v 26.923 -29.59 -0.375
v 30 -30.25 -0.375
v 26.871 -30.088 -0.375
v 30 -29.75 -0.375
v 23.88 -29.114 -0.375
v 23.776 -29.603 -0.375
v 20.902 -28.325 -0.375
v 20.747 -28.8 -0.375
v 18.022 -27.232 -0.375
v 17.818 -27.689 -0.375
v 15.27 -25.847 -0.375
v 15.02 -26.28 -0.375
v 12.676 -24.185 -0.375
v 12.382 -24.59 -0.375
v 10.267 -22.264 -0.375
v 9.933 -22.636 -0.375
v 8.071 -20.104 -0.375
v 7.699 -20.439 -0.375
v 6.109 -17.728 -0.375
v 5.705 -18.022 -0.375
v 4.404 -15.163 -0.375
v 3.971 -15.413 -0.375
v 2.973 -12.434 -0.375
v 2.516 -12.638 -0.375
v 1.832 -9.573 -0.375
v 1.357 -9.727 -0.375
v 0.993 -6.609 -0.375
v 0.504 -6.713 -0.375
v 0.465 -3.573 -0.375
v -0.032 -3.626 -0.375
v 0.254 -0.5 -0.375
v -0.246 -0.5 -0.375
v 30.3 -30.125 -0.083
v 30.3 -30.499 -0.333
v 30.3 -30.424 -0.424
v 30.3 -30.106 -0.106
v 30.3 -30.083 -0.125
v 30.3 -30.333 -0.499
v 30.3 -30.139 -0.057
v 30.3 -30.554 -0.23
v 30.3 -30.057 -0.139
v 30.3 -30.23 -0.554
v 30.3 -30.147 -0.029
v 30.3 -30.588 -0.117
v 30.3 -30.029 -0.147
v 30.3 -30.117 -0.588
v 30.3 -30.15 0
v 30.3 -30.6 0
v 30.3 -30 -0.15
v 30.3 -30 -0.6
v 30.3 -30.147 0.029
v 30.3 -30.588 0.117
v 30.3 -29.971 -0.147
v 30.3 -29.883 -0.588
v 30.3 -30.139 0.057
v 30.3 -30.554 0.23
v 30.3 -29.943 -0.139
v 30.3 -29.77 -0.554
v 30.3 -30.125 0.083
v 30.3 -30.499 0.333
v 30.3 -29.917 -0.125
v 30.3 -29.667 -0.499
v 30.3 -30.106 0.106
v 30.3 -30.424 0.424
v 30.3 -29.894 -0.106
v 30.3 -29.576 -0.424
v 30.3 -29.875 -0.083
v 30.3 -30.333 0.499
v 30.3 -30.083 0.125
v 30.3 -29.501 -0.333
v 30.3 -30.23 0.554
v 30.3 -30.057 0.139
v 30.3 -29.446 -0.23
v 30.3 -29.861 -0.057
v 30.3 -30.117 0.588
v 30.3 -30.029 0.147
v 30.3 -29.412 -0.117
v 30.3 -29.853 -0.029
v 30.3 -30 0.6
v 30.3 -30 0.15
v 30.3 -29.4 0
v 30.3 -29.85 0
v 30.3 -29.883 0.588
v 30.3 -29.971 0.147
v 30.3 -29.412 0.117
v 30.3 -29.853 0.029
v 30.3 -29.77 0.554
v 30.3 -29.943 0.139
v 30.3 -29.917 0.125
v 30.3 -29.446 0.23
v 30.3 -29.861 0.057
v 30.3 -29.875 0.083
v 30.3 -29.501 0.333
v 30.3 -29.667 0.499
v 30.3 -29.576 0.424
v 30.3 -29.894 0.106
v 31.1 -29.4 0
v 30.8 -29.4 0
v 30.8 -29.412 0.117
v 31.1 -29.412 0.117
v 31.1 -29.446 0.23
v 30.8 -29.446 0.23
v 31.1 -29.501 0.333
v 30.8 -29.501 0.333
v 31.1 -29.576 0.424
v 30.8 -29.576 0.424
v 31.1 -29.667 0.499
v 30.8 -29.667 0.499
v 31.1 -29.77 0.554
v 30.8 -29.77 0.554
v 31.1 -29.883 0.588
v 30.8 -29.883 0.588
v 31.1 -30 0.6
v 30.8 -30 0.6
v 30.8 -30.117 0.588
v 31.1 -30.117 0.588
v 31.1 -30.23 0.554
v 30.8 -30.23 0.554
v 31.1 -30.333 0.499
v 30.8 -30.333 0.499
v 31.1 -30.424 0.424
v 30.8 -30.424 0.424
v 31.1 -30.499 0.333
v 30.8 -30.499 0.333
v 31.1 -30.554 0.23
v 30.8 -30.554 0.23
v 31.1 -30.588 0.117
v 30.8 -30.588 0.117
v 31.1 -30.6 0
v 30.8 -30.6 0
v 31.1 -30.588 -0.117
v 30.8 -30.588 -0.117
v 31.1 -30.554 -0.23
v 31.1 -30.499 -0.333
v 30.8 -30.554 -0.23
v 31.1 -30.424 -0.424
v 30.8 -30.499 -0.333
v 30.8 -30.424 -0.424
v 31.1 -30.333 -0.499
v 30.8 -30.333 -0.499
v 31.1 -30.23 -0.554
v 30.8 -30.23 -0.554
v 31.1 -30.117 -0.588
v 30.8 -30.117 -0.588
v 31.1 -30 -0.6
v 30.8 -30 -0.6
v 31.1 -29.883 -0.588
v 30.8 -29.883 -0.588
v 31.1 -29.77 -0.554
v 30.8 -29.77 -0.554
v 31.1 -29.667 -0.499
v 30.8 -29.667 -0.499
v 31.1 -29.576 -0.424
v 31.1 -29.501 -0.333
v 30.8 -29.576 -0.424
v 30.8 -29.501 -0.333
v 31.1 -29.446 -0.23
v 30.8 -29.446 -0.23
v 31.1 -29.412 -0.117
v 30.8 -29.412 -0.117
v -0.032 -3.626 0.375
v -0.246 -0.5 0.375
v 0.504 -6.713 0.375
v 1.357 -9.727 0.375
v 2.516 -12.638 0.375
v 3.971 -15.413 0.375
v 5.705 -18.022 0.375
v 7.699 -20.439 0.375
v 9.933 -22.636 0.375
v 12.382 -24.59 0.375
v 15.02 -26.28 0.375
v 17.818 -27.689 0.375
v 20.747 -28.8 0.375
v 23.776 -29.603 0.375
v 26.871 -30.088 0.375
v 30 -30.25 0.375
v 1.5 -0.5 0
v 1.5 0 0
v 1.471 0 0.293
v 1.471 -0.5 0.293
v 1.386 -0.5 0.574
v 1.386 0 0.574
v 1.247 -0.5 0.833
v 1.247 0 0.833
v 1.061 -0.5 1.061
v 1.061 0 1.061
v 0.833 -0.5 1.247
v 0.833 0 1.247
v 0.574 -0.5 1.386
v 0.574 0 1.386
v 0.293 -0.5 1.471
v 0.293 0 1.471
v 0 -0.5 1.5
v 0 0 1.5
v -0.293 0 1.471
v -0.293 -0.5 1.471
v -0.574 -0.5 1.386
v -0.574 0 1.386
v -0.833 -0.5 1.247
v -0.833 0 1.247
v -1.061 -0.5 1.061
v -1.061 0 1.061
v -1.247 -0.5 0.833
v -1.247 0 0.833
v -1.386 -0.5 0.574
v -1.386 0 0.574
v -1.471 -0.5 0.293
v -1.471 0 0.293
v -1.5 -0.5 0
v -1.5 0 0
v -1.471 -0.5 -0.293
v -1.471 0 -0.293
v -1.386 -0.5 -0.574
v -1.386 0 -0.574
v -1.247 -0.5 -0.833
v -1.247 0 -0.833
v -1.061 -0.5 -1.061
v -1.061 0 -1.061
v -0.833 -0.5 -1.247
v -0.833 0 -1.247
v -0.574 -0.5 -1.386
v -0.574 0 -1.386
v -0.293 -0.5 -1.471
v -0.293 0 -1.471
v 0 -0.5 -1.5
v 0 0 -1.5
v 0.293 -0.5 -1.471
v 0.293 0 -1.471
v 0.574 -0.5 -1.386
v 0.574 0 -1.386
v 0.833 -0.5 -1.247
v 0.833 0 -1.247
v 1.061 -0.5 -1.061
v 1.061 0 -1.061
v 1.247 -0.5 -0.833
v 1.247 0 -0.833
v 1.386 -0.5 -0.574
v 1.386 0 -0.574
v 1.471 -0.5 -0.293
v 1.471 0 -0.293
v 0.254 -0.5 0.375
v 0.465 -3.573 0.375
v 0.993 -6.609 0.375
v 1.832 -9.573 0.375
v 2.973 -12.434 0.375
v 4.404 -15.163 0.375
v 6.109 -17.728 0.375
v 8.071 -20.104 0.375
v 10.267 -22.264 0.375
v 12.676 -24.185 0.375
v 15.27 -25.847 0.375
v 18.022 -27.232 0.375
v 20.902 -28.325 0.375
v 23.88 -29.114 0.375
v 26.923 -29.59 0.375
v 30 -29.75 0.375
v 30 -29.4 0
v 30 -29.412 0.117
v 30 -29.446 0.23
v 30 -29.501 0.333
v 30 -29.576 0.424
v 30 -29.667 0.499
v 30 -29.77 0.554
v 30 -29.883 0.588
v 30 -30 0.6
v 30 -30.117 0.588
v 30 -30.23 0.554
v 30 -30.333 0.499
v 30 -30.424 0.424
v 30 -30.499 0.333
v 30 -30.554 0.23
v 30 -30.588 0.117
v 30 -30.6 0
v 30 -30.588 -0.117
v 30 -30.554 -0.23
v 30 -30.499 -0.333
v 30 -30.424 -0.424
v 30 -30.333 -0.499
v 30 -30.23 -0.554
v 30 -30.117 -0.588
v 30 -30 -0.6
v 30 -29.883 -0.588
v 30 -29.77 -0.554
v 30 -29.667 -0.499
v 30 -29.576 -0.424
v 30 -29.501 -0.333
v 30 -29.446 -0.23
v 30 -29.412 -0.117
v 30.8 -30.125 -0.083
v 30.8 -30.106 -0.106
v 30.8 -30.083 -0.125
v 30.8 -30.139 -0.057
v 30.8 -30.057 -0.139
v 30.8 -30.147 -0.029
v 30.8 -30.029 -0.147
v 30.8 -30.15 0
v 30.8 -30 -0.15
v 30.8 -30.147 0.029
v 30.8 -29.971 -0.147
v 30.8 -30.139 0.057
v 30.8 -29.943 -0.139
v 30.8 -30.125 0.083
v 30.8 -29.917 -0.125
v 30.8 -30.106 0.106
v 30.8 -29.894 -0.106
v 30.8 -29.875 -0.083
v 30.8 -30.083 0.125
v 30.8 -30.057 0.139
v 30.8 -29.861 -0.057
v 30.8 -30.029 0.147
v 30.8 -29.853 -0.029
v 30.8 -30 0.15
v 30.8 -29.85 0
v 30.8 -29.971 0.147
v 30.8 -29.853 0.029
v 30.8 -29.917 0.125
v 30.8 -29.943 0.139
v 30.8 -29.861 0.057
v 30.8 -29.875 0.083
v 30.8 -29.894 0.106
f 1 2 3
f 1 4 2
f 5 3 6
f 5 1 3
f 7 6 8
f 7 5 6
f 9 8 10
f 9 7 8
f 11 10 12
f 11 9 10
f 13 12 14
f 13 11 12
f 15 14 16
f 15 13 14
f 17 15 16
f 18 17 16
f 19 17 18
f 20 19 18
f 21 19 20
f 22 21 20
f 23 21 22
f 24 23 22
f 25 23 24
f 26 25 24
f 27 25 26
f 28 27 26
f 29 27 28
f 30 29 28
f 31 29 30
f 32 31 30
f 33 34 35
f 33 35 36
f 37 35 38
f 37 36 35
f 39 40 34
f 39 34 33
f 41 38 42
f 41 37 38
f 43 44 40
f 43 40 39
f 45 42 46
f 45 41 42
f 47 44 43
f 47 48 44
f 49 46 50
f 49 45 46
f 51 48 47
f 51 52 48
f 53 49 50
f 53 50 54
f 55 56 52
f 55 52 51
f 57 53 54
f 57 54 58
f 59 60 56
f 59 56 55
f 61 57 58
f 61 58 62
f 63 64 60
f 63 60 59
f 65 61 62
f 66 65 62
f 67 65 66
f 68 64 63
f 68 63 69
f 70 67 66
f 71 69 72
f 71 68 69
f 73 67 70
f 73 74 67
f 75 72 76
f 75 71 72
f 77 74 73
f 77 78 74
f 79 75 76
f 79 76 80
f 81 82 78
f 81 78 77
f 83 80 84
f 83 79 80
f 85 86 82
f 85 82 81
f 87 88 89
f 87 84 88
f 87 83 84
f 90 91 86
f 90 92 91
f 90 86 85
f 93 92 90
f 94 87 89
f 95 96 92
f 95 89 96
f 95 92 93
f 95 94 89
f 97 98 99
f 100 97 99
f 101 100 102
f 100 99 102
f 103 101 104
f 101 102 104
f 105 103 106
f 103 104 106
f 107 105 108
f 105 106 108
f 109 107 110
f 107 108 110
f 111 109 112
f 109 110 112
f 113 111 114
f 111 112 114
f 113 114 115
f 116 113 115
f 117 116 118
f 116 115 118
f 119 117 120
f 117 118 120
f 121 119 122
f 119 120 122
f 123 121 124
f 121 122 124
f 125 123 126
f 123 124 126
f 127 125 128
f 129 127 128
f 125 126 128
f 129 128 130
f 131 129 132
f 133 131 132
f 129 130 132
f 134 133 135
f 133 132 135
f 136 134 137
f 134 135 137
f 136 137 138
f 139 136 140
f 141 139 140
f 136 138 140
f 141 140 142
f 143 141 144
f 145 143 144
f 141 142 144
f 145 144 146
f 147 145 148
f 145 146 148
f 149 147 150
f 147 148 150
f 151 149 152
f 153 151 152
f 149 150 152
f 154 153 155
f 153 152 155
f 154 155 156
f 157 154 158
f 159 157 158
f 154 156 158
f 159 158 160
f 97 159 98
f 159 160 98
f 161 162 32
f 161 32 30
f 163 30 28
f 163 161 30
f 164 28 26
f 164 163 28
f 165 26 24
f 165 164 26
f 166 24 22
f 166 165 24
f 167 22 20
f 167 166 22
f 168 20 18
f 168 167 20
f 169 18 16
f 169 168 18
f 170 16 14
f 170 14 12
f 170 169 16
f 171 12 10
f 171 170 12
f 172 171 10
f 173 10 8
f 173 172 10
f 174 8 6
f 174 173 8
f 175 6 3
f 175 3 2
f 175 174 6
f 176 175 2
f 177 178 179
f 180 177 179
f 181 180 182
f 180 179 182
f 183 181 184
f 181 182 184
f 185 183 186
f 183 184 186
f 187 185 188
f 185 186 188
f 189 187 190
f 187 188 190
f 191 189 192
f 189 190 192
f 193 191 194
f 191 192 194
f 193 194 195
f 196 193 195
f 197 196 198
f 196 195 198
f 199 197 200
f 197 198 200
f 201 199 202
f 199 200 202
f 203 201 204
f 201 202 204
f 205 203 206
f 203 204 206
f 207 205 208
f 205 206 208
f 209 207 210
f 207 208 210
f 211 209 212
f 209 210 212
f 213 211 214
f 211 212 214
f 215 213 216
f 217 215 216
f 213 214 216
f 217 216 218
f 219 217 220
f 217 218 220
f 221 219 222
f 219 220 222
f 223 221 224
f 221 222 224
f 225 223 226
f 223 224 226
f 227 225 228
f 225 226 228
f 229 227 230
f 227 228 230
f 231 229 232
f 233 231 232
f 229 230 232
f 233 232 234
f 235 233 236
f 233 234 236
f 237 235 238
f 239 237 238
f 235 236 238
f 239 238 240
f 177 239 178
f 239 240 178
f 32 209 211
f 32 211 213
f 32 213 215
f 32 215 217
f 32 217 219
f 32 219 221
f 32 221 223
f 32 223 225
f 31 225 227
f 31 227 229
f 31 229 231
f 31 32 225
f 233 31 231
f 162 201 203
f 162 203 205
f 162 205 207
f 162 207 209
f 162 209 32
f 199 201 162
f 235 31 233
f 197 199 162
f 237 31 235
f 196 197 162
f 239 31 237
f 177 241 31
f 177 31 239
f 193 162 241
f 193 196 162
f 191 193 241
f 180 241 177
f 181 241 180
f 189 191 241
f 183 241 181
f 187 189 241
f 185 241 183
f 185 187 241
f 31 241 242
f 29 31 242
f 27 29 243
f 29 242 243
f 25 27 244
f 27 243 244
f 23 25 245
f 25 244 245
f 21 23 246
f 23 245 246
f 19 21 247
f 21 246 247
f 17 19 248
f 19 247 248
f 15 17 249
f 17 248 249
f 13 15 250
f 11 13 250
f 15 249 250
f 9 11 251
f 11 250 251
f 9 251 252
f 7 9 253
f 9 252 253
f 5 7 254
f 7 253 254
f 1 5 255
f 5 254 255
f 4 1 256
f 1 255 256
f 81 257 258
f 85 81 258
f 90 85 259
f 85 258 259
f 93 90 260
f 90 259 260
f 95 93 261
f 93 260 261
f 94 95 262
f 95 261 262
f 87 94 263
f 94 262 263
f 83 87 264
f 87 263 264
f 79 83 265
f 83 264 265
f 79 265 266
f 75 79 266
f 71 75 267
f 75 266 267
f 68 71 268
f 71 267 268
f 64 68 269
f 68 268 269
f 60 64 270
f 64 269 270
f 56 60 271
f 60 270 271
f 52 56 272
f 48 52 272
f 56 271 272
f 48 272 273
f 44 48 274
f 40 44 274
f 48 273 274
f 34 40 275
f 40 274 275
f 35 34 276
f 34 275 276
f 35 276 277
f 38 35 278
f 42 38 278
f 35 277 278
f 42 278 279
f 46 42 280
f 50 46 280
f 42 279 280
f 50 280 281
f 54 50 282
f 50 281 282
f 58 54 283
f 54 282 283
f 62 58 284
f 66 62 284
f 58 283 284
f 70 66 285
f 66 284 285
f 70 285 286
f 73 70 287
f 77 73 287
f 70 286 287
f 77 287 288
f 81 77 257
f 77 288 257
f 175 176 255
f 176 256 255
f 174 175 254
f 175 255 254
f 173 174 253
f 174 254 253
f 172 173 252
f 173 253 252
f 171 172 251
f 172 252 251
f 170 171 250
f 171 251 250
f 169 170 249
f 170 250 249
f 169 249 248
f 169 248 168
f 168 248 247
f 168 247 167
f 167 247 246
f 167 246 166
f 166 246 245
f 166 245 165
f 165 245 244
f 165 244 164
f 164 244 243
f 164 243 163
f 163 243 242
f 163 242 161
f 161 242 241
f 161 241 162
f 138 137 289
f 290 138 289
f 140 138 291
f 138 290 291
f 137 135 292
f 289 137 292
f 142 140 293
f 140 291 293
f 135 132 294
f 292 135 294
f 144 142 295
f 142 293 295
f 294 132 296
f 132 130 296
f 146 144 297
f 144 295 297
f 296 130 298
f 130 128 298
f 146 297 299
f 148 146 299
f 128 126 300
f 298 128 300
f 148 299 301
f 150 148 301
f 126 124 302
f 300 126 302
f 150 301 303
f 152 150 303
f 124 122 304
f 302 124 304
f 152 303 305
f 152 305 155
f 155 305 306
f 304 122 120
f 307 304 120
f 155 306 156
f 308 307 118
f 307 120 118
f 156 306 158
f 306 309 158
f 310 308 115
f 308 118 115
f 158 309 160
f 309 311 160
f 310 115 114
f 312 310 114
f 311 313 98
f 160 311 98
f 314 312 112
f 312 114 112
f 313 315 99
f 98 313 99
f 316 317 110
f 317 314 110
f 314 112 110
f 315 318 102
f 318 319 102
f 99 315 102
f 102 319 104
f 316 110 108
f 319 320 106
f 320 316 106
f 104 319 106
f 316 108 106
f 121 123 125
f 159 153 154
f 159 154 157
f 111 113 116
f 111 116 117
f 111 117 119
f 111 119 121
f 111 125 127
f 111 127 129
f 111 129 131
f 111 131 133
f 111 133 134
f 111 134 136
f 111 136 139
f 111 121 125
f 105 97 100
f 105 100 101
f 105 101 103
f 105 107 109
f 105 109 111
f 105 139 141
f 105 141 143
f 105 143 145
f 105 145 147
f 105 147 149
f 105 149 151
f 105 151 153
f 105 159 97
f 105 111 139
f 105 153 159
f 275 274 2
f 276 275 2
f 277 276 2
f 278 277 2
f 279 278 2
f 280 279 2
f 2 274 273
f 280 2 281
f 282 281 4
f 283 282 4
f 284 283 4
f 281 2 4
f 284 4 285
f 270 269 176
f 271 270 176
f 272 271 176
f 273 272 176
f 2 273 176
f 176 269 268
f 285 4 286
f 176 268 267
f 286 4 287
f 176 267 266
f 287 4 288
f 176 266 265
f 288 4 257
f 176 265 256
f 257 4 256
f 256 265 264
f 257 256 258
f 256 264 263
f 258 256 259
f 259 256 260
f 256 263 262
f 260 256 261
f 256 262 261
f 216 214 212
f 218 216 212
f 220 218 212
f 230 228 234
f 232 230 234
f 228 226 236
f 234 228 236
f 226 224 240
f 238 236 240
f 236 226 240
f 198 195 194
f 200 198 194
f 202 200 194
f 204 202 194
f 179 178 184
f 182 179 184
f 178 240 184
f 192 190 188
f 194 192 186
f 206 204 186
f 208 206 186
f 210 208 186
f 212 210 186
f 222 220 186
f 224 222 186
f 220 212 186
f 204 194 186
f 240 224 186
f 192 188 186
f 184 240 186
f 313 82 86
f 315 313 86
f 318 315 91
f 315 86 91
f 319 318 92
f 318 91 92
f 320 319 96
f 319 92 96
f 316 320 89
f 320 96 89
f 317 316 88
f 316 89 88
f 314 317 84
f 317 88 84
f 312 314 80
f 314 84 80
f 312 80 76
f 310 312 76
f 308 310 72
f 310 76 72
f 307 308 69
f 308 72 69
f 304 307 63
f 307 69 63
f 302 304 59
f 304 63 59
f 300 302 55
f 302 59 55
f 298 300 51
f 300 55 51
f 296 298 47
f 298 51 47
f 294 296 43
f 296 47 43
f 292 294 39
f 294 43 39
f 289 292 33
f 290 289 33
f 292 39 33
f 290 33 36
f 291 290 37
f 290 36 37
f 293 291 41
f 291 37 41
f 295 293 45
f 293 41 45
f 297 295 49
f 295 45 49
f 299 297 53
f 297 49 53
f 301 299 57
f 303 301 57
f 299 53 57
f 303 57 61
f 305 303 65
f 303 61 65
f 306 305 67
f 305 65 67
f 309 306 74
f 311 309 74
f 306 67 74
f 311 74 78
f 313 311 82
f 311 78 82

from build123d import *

# Parameters (mm, degrees)
PAD_DEPTH    = 0.375
SKETCH002_R  = 1.5
PAD001_DEPTH = 0.5
SKETCH003_R  = 0.6
PAD002_DEPTH = 0.3
SKETCH004_R  = 0.15
PAD003_DEPTH = 0.5
SKETCH005_R  = 0.6
PAD004_DEPTH = 0.3


with BuildPart() as part:
    # Sketch → Pad (new body, symmetric)
    with BuildSketch(Plane.XY):
        with BuildLine():
            Line((-0.25, 0), (0, 0))
            Line((0, 0), (0.25, 0))
            ThreePointArc((0.25, 0), (8.963573, -21.036427), (30, -29.75))
            Line((30, -29.75), (30, -30))
            Line((30, -30), (30, -30.25))
            ThreePointArc((-0.25, 0), (8.61002, -21.38998), (30, -30.25))
        make_face()
    extrude(amount=PAD_DEPTH, both=True)

    # Sketch002 → Pad001 (join)
    with BuildSketch(Plane.XZ):
        Circle(SKETCH002_R)
    extrude(amount=PAD001_DEPTH)

    # Sketch003 (on DatumPlane) → Pad002 (join)
    with BuildSketch(Plane(origin=(30, -30, 0), x_dir=(0, 1, 0), z_dir=(1, 0, 0))):
        Circle(SKETCH003_R)
    extrude(amount=PAD002_DEPTH)

    # Sketch004 (on DatumPlane) → Pad003 (join)
    with BuildSketch(Plane(origin=(30.3, -30, 0), x_dir=(0, 1, 0), z_dir=(1, 0, 0))):
        Circle(SKETCH004_R)
    extrude(amount=PAD003_DEPTH)

    # Sketch005 (on DatumPlane) → Pad004 (join)
    with BuildSketch(Plane(origin=(30.8, -30, 0), x_dir=(0, 1, 0), z_dir=(1, 0, 0))):
        Circle(SKETCH005_R)
    extrude(amount=PAD004_DEPTH)


solid = part.part
